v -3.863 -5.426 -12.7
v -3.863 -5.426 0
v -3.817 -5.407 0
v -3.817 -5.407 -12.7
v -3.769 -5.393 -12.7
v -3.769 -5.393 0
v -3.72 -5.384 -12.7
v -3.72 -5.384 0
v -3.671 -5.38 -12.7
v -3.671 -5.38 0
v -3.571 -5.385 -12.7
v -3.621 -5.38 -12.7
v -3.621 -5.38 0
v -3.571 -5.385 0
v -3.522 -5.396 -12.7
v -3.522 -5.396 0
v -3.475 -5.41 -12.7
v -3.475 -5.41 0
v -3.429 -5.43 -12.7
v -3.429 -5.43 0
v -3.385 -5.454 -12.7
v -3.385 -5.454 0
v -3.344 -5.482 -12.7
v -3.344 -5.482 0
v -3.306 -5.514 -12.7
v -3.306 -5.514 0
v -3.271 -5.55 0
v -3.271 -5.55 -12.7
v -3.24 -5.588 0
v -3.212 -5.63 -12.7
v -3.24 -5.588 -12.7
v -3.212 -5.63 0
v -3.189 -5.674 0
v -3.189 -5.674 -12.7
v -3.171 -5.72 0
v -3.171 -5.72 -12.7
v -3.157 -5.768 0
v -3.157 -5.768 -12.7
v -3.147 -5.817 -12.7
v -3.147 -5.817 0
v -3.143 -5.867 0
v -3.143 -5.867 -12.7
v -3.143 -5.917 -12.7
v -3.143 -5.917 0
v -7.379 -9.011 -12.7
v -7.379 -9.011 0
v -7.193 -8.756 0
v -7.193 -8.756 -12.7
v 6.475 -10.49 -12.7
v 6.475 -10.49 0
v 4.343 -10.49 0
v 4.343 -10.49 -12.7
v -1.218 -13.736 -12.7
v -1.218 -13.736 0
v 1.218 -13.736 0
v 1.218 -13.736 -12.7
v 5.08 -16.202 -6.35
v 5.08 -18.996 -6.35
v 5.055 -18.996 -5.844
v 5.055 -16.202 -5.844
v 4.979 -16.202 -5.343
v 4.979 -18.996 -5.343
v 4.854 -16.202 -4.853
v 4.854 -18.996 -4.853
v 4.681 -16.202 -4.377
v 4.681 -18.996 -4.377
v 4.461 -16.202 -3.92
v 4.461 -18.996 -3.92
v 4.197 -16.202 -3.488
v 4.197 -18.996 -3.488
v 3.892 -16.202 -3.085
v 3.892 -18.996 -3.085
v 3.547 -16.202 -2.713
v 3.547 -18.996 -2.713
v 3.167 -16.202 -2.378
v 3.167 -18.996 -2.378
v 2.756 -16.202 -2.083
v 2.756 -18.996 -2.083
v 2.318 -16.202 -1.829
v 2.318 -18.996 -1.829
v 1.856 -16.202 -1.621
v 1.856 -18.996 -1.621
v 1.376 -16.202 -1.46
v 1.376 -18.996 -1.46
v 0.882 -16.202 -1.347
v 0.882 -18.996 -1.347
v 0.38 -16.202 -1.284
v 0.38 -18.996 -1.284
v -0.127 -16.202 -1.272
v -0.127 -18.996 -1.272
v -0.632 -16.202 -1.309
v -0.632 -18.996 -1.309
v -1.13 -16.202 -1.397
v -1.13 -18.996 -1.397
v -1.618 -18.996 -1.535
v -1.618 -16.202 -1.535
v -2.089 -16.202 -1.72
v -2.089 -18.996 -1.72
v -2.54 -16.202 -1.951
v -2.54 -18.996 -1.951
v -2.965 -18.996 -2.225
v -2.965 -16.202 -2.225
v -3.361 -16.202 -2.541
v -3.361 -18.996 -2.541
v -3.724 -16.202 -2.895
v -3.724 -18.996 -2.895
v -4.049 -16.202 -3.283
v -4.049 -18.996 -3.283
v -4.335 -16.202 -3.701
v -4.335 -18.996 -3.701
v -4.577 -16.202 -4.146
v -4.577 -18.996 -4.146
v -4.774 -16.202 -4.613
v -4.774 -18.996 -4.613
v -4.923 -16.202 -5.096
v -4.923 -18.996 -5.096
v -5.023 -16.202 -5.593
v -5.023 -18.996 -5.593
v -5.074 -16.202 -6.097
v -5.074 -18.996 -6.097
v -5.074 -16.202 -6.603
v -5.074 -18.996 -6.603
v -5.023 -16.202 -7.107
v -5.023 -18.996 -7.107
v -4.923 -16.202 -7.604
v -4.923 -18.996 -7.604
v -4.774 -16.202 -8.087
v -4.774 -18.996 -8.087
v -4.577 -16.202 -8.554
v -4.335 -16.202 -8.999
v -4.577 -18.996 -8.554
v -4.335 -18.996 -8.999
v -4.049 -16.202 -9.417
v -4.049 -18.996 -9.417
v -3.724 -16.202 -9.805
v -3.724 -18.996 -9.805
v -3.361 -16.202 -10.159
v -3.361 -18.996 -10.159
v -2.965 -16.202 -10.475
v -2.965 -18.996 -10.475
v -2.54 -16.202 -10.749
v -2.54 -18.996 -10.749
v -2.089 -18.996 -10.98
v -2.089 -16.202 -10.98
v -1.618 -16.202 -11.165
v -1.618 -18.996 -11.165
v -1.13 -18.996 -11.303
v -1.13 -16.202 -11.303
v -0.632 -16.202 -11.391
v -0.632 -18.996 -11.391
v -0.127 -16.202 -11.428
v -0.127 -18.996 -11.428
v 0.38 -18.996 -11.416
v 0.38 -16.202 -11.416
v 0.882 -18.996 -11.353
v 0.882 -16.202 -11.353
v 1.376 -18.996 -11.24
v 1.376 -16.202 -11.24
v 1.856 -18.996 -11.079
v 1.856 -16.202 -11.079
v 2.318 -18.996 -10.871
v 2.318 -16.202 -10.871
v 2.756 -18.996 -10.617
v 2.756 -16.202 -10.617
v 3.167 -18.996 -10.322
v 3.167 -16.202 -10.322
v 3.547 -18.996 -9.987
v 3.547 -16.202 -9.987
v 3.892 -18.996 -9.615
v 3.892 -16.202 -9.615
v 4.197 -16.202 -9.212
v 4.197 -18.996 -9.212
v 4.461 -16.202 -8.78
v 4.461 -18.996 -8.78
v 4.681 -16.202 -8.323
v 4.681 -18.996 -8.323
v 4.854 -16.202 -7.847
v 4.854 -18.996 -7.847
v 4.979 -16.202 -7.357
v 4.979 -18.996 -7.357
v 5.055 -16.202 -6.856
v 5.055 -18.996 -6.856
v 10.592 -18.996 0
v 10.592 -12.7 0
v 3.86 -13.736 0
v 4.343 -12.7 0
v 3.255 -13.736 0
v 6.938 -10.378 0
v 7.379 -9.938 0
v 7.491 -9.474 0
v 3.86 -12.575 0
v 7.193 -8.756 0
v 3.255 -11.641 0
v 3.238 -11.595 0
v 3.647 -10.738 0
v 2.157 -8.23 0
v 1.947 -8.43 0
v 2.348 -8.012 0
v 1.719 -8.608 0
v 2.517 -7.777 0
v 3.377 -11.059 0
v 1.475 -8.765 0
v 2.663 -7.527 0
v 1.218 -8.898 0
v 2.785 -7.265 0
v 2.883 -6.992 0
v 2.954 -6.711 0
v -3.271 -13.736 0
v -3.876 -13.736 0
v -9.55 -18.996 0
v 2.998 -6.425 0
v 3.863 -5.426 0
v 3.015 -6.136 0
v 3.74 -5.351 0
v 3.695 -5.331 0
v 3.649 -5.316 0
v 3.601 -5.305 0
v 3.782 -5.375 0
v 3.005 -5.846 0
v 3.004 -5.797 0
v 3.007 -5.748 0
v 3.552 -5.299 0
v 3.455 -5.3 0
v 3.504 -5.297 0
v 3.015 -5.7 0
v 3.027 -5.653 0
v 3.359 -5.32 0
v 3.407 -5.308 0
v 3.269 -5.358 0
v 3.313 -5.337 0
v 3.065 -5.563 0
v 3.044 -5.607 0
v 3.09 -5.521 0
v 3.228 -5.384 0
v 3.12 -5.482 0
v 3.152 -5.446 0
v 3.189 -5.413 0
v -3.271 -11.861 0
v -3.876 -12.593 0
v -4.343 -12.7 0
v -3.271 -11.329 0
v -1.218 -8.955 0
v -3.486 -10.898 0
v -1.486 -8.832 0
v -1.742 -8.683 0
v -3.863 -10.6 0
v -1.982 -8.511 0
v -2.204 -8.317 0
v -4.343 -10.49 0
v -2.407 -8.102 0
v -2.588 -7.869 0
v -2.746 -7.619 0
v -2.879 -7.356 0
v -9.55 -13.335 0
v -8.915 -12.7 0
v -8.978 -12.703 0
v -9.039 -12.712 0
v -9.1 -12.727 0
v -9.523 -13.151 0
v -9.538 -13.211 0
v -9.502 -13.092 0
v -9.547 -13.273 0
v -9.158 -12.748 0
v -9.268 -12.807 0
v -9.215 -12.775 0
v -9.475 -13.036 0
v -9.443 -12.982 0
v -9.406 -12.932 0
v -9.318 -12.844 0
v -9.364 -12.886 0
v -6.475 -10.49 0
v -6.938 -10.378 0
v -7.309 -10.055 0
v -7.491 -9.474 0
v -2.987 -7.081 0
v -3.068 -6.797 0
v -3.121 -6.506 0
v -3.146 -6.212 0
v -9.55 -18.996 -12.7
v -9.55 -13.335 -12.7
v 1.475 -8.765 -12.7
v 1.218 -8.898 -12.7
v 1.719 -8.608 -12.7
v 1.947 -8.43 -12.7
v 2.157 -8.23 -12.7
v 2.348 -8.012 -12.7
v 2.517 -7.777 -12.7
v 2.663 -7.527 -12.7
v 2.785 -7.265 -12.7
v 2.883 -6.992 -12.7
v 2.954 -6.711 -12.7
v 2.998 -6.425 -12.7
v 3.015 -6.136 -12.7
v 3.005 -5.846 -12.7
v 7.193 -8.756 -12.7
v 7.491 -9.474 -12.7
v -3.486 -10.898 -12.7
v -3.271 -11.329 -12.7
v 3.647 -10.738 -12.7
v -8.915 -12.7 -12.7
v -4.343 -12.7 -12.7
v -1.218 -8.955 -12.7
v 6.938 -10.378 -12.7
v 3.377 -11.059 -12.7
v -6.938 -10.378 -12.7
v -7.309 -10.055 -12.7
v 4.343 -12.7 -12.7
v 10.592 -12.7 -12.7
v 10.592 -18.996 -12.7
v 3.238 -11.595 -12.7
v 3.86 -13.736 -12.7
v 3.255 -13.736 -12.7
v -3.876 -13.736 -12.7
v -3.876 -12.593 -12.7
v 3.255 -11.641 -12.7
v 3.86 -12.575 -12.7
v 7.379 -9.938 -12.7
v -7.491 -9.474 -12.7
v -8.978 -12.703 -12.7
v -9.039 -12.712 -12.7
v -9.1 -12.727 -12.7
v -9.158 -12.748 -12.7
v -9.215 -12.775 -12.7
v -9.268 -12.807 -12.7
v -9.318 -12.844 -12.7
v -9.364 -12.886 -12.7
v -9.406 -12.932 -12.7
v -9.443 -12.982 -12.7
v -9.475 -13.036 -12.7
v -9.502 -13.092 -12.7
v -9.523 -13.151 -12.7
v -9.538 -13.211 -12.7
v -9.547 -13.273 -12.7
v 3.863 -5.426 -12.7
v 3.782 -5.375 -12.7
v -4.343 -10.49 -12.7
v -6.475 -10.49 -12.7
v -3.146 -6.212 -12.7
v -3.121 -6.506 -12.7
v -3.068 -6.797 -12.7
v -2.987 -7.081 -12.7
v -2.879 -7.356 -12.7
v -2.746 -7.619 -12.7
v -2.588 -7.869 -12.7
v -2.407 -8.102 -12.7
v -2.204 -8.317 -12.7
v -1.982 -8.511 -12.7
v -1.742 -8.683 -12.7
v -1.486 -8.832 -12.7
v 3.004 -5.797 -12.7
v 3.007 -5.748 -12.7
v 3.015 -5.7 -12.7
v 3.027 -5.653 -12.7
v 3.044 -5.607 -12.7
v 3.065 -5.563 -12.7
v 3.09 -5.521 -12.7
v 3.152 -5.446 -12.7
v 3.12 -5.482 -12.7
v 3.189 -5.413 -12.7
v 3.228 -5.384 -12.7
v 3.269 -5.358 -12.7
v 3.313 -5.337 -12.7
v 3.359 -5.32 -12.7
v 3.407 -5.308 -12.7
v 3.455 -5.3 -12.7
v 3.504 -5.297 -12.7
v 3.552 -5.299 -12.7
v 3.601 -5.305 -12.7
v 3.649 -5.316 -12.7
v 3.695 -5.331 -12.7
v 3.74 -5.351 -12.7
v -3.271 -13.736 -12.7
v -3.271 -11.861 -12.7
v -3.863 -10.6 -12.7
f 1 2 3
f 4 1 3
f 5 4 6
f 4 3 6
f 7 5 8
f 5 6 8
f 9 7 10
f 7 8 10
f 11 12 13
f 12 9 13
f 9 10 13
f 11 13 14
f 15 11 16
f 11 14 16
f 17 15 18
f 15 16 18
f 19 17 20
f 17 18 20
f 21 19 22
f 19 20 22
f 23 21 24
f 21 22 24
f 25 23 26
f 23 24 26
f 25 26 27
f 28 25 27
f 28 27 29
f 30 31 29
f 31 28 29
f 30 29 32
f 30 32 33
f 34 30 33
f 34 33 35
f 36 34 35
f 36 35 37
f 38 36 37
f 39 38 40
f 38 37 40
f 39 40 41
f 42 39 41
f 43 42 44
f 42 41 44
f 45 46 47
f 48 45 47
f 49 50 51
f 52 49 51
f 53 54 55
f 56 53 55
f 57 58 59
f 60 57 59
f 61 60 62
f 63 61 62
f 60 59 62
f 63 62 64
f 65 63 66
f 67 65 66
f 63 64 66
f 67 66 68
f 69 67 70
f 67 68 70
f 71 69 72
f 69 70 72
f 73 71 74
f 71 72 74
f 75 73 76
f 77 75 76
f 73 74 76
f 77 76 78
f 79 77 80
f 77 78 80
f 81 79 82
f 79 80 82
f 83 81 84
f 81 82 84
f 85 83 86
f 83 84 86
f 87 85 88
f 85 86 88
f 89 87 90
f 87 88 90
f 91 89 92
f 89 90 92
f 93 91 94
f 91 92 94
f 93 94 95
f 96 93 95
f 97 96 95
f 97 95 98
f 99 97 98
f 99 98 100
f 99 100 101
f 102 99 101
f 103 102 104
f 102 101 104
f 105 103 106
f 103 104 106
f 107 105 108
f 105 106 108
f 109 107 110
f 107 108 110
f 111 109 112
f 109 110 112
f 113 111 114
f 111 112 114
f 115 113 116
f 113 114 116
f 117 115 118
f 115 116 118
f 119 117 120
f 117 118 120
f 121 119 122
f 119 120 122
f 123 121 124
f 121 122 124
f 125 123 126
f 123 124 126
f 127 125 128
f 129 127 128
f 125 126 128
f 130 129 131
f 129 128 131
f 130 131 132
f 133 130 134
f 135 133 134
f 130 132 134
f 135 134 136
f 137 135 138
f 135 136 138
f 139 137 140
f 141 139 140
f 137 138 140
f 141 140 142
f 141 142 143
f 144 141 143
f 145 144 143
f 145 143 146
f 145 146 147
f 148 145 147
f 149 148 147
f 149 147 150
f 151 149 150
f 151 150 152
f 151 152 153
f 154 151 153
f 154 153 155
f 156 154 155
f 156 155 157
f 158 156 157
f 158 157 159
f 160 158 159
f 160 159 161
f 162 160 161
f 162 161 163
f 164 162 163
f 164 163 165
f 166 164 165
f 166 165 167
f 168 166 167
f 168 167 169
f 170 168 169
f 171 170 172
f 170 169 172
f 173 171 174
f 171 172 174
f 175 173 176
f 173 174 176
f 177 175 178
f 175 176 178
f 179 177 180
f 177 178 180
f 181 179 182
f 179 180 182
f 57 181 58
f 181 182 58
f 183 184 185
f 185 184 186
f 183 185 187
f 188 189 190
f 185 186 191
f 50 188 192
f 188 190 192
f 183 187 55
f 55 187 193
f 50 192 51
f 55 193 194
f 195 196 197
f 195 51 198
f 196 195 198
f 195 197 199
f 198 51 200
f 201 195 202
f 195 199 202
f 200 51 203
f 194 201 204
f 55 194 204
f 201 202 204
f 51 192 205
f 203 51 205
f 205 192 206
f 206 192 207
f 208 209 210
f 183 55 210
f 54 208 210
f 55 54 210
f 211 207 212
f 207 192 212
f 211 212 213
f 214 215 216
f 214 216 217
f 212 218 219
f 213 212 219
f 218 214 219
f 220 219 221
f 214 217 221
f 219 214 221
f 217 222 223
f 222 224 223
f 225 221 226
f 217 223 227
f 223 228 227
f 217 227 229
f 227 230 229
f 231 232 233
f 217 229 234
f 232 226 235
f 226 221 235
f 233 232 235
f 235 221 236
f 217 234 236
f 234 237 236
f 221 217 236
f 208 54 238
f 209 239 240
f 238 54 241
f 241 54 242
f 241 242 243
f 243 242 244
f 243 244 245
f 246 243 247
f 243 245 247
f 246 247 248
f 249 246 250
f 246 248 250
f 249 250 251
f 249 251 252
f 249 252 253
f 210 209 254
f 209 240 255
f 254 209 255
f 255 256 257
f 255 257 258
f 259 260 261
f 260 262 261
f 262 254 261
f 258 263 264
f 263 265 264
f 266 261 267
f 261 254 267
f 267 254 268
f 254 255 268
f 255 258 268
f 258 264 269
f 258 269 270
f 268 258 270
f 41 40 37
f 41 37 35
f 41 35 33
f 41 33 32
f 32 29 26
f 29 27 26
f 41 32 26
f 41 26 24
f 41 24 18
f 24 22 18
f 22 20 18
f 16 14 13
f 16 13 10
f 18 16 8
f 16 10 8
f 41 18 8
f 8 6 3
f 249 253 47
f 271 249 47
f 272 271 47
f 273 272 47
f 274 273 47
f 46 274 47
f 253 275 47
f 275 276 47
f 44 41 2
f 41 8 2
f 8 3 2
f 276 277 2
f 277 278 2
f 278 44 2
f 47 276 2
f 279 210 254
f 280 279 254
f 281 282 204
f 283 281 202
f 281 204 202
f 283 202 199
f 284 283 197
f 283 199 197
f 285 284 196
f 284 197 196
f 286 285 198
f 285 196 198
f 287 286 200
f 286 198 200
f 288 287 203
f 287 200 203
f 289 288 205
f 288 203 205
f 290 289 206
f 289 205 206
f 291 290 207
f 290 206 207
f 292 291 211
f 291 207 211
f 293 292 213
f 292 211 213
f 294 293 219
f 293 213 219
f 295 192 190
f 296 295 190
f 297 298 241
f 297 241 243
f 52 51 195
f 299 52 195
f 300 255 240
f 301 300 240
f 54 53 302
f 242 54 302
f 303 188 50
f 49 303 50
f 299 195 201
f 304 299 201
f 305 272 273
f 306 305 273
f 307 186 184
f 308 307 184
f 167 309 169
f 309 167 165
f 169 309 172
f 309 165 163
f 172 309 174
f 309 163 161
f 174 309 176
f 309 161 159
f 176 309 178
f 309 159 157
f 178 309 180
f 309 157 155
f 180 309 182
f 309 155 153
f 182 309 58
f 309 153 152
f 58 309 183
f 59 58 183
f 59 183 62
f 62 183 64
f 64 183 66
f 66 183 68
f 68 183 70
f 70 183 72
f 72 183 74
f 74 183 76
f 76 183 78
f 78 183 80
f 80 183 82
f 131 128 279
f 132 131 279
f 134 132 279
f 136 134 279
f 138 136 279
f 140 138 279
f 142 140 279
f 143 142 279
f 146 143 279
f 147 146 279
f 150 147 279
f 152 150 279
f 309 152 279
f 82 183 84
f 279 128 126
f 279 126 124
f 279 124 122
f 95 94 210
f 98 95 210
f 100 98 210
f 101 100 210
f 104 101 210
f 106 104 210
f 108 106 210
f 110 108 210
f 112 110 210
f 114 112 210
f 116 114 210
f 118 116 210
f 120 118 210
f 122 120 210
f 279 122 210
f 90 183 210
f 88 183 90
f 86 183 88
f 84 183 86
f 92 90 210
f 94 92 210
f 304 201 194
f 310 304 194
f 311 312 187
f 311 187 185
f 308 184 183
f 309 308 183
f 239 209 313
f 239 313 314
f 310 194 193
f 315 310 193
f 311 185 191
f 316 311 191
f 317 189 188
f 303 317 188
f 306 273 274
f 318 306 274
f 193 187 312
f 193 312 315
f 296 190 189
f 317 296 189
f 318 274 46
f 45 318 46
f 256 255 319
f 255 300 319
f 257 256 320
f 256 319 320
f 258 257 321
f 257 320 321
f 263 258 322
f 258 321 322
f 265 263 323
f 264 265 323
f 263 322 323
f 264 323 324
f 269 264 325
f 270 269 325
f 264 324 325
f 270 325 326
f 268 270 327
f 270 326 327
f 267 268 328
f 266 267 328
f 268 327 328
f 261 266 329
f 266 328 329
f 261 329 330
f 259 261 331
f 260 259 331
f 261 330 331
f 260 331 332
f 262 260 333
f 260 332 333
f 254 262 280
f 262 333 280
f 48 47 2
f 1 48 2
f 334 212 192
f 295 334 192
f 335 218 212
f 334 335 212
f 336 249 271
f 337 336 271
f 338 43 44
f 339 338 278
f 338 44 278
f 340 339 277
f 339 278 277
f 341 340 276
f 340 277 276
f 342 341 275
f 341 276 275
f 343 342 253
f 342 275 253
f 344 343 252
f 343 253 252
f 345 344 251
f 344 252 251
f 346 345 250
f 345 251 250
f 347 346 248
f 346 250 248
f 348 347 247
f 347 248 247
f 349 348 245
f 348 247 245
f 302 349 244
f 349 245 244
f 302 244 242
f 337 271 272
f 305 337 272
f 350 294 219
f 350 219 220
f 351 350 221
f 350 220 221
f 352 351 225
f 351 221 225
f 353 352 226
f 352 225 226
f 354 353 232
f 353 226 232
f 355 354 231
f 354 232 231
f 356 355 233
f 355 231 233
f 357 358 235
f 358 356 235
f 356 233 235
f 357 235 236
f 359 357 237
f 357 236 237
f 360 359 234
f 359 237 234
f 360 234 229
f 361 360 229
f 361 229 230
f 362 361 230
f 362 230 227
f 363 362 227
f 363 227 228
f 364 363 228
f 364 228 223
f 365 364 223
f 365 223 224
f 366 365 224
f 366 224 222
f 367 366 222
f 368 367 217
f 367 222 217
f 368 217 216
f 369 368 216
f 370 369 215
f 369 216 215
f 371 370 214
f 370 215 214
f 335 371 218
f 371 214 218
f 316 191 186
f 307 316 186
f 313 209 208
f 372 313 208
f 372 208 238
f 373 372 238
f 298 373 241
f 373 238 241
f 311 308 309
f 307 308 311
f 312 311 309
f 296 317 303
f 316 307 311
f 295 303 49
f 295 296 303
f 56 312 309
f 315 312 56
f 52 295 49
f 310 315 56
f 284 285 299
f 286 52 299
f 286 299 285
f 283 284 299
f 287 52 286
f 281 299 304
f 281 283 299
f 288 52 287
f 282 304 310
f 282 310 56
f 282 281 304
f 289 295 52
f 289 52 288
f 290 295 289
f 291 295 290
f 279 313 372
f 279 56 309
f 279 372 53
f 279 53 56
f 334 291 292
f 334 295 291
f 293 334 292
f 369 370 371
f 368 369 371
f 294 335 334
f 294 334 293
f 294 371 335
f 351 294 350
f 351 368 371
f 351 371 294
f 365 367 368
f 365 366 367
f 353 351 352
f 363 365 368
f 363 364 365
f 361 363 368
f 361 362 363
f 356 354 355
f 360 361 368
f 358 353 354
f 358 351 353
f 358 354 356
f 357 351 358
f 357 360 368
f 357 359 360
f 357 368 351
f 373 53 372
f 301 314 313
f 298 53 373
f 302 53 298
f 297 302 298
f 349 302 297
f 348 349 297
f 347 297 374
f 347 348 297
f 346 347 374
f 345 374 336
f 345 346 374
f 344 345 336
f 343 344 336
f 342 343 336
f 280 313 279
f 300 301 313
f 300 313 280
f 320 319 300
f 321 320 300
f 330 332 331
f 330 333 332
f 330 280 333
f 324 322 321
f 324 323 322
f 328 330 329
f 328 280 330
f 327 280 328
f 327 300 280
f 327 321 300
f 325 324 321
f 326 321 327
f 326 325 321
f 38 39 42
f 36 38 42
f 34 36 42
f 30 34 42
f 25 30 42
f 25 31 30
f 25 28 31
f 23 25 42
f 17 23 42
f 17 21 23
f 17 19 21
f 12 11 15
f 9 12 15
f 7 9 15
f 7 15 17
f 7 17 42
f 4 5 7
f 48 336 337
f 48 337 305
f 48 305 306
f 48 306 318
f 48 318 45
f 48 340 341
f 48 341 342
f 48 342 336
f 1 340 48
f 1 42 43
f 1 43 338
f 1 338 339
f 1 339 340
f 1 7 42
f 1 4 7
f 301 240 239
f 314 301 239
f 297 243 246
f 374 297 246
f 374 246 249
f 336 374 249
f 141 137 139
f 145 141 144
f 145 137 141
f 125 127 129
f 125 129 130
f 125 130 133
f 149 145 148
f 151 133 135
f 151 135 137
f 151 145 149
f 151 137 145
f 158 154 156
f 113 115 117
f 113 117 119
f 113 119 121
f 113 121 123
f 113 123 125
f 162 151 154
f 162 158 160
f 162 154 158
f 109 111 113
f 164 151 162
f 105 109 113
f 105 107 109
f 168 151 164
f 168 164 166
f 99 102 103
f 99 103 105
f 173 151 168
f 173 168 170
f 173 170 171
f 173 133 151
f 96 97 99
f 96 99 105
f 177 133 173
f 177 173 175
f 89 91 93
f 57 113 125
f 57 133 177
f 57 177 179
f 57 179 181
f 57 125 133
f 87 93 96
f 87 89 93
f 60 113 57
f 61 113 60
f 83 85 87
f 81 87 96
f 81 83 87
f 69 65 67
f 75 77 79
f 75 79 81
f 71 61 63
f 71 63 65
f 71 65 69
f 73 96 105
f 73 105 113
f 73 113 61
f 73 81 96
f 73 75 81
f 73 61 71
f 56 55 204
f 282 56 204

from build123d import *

# Parameters (mm, degrees)
BOSS_EXTRUDE1_DEPTH = 12.7
SKETCH10_R          = 3.082136138
CUT_EXTRUDE1_DEPTH  = 26.185474767
SKETCH11_W          = 2.435876878
SKETCH11_H          = 7.908405343
CUT_EXTRUDE2_DEPTH  = 26.185474767
FILLET1_R           = 0.635
FILLET3_R           = 0.508
SKETCH17_W          = 0.605016918
SKETCH17_H          = 2.095446093
SKETCH17_W_2        = 0.604461085
SKETCH17_H_2        = 2.141007526
CUT_EXTRUDE7_DEPTH  = 26.185474767
SKETCH18_R          = 5.08
CUT_EXTRUDE8_DEPTH  = 2.794


with BuildPart() as part:
    # Sketch5 → Boss-Extrude1 (new body)
    with BuildSketch(Plane.XY):
        Polygon((-6.474794456, -10.4902), (-6.938297275, -10.378313453), (-7.308763147, -10.05450356), (-7.490794456, -9.4742), (-7.378907909, -9.01069718), (-7.193214945, -8.75577951), (-3.863171405, -5.42573597), (-2.833127272, -4.737482484), (-1.618107374, -4.4958), (1.618107374, -4.4958), (2.668236067, -4.674493152), (3.863171405, -5.42573597), (7.193214945, -8.75577951), (7.490794456, -9.4742), (7.378907909, -9.93770282), (6.938297275, -10.378313453), (6.474794456, -10.4902), (4.3434, -10.4902), (3.646537163, -10.737670005), (3.377082754, -11.059343535), (3.2385, -11.5951), (3.485970005, -12.291962837), (3.807643535, -12.561417246), (4.3434, -12.7), (10.5918, -12.7), (10.5918, -18.995576116), (-9.5504, -18.995576116), (-9.5504, -12.7), (-4.3434, -12.7), (-3.863171405, -12.590180165), (-3.485969976, -12.291962837), (-3.271081829, -11.861441531), (-3.271081829, -11.328758469), (-3.485969976, -10.898237163), (-3.863171405, -10.600019835), (-4.3434, -10.4902), align=None)
    extrude(amount=-BOSS_EXTRUDE1_DEPTH)

    # Sketch10 → Cut-Extrude1 (cut, through all)
    with BuildSketch(Plane.XY):
        with Locations((-0.066530556, -6.095976424)):
            Circle(SKETCH10_R)
    extrude(amount=-CUT_EXTRUDE1_DEPTH, mode=Mode.SUBTRACT)

    # Sketch11 → Cut-Extrude2 (cut, through all)
    with BuildSketch(Plane.XY):
        with Locations((0, -9.781904855)):
            Rectangle(SKETCH11_W, SKETCH11_H)
    extrude(amount=-CUT_EXTRUDE2_DEPTH, mode=Mode.SUBTRACT)

    # Fillet1
    fillet1_edges = [part.edges().sort_by_distance(p)[0] for p in [
        (-9.5504, -12.7, -6.35),
    ]]
    fillet(fillet1_edges, radius=FILLET1_R)

    # Fillet3
    # the kernel refuses this fillet: 0.508 mm, written as the material it takes off along each edge
    with BuildSketch(Plane(origin=(2.668236067, -4.674493152, 3.28944818), x_dir=(0.8465916632907232, -0.5322429479538895, 0), z_dir=(0, 0, -1))) as fillet3_piece_1:
        with BuildLine():
            CenterArc((1.315779272, 0.508), FILLET3_R, 143.192029884, 126.807970116)
            Line((0.90905007, 0.812360569), (0.900915486, 0.81844778))
            ThreePointArc((0.900915486, 0.81844778), (0.488321858, 0.368360866), (-0.005137978, 0.008765089))
            Line((-0.005137978, 0.008765089), (0, -0.01016))
            Line((0, -0.01016), (1.315779272, -0.01016))
            Line((1.315779272, -0.01016), (1.315779272, 0))
        make_face()
    extrude(amount=19.278896361, mode=Mode.SUBTRACT)
    with BuildSketch(Plane(origin=(-2.833127272, -4.737482484, 3.097058862), x_dir=(-0.8314696122997464, -0.5555702330237908, 0), z_dir=(0, 0, -1))) as fillet3_piece_2:
        with BuildLine():
            CenterArc((1.31839441, -0.501729486), FILLET3_R, 99.011665767, 118.073467257)
            Line((0.913142276, -0.808054001), (0.905037233, -0.814180491))
            ThreePointArc((0.905037233, -0.814180491), (0.490196501, -0.366028623), (-0.005094947, -0.008790172))
            Line((-0.005094947, -0.008790172), (0, 0.01016))
            ThreePointArc((0, 0.01016), (0.619411772, 0.01016), (1.237232128, 0.01003459))
            Line((1.237232128, 0.01003459), (1.238823545, 0))
        make_face()
    extrude(amount=18.894117724, mode=Mode.SUBTRACT)

    # Sketch17 → Cut-Extrude7 (cut, through all)
    with BuildSketch(Plane.XY):
        with Locations((3.55718824, -12.68838448)):
            Rectangle(SKETCH17_W, SKETCH17_H)
        with Locations((-3.573312372, -12.665603763)):
            Rectangle(SKETCH17_W_2, SKETCH17_H_2)
    extrude(amount=-CUT_EXTRUDE7_DEPTH, mode=Mode.SUBTRACT)

    # Sketch18 → Cut-Extrude8 (cut)
    with BuildSketch(Plane.XZ.offset(18.995576116)):
        with Locations((0, -6.35)):
            Circle(SKETCH18_R)
    extrude(amount=-CUT_EXTRUDE8_DEPTH, mode=Mode.SUBTRACT)


solid = part.part
